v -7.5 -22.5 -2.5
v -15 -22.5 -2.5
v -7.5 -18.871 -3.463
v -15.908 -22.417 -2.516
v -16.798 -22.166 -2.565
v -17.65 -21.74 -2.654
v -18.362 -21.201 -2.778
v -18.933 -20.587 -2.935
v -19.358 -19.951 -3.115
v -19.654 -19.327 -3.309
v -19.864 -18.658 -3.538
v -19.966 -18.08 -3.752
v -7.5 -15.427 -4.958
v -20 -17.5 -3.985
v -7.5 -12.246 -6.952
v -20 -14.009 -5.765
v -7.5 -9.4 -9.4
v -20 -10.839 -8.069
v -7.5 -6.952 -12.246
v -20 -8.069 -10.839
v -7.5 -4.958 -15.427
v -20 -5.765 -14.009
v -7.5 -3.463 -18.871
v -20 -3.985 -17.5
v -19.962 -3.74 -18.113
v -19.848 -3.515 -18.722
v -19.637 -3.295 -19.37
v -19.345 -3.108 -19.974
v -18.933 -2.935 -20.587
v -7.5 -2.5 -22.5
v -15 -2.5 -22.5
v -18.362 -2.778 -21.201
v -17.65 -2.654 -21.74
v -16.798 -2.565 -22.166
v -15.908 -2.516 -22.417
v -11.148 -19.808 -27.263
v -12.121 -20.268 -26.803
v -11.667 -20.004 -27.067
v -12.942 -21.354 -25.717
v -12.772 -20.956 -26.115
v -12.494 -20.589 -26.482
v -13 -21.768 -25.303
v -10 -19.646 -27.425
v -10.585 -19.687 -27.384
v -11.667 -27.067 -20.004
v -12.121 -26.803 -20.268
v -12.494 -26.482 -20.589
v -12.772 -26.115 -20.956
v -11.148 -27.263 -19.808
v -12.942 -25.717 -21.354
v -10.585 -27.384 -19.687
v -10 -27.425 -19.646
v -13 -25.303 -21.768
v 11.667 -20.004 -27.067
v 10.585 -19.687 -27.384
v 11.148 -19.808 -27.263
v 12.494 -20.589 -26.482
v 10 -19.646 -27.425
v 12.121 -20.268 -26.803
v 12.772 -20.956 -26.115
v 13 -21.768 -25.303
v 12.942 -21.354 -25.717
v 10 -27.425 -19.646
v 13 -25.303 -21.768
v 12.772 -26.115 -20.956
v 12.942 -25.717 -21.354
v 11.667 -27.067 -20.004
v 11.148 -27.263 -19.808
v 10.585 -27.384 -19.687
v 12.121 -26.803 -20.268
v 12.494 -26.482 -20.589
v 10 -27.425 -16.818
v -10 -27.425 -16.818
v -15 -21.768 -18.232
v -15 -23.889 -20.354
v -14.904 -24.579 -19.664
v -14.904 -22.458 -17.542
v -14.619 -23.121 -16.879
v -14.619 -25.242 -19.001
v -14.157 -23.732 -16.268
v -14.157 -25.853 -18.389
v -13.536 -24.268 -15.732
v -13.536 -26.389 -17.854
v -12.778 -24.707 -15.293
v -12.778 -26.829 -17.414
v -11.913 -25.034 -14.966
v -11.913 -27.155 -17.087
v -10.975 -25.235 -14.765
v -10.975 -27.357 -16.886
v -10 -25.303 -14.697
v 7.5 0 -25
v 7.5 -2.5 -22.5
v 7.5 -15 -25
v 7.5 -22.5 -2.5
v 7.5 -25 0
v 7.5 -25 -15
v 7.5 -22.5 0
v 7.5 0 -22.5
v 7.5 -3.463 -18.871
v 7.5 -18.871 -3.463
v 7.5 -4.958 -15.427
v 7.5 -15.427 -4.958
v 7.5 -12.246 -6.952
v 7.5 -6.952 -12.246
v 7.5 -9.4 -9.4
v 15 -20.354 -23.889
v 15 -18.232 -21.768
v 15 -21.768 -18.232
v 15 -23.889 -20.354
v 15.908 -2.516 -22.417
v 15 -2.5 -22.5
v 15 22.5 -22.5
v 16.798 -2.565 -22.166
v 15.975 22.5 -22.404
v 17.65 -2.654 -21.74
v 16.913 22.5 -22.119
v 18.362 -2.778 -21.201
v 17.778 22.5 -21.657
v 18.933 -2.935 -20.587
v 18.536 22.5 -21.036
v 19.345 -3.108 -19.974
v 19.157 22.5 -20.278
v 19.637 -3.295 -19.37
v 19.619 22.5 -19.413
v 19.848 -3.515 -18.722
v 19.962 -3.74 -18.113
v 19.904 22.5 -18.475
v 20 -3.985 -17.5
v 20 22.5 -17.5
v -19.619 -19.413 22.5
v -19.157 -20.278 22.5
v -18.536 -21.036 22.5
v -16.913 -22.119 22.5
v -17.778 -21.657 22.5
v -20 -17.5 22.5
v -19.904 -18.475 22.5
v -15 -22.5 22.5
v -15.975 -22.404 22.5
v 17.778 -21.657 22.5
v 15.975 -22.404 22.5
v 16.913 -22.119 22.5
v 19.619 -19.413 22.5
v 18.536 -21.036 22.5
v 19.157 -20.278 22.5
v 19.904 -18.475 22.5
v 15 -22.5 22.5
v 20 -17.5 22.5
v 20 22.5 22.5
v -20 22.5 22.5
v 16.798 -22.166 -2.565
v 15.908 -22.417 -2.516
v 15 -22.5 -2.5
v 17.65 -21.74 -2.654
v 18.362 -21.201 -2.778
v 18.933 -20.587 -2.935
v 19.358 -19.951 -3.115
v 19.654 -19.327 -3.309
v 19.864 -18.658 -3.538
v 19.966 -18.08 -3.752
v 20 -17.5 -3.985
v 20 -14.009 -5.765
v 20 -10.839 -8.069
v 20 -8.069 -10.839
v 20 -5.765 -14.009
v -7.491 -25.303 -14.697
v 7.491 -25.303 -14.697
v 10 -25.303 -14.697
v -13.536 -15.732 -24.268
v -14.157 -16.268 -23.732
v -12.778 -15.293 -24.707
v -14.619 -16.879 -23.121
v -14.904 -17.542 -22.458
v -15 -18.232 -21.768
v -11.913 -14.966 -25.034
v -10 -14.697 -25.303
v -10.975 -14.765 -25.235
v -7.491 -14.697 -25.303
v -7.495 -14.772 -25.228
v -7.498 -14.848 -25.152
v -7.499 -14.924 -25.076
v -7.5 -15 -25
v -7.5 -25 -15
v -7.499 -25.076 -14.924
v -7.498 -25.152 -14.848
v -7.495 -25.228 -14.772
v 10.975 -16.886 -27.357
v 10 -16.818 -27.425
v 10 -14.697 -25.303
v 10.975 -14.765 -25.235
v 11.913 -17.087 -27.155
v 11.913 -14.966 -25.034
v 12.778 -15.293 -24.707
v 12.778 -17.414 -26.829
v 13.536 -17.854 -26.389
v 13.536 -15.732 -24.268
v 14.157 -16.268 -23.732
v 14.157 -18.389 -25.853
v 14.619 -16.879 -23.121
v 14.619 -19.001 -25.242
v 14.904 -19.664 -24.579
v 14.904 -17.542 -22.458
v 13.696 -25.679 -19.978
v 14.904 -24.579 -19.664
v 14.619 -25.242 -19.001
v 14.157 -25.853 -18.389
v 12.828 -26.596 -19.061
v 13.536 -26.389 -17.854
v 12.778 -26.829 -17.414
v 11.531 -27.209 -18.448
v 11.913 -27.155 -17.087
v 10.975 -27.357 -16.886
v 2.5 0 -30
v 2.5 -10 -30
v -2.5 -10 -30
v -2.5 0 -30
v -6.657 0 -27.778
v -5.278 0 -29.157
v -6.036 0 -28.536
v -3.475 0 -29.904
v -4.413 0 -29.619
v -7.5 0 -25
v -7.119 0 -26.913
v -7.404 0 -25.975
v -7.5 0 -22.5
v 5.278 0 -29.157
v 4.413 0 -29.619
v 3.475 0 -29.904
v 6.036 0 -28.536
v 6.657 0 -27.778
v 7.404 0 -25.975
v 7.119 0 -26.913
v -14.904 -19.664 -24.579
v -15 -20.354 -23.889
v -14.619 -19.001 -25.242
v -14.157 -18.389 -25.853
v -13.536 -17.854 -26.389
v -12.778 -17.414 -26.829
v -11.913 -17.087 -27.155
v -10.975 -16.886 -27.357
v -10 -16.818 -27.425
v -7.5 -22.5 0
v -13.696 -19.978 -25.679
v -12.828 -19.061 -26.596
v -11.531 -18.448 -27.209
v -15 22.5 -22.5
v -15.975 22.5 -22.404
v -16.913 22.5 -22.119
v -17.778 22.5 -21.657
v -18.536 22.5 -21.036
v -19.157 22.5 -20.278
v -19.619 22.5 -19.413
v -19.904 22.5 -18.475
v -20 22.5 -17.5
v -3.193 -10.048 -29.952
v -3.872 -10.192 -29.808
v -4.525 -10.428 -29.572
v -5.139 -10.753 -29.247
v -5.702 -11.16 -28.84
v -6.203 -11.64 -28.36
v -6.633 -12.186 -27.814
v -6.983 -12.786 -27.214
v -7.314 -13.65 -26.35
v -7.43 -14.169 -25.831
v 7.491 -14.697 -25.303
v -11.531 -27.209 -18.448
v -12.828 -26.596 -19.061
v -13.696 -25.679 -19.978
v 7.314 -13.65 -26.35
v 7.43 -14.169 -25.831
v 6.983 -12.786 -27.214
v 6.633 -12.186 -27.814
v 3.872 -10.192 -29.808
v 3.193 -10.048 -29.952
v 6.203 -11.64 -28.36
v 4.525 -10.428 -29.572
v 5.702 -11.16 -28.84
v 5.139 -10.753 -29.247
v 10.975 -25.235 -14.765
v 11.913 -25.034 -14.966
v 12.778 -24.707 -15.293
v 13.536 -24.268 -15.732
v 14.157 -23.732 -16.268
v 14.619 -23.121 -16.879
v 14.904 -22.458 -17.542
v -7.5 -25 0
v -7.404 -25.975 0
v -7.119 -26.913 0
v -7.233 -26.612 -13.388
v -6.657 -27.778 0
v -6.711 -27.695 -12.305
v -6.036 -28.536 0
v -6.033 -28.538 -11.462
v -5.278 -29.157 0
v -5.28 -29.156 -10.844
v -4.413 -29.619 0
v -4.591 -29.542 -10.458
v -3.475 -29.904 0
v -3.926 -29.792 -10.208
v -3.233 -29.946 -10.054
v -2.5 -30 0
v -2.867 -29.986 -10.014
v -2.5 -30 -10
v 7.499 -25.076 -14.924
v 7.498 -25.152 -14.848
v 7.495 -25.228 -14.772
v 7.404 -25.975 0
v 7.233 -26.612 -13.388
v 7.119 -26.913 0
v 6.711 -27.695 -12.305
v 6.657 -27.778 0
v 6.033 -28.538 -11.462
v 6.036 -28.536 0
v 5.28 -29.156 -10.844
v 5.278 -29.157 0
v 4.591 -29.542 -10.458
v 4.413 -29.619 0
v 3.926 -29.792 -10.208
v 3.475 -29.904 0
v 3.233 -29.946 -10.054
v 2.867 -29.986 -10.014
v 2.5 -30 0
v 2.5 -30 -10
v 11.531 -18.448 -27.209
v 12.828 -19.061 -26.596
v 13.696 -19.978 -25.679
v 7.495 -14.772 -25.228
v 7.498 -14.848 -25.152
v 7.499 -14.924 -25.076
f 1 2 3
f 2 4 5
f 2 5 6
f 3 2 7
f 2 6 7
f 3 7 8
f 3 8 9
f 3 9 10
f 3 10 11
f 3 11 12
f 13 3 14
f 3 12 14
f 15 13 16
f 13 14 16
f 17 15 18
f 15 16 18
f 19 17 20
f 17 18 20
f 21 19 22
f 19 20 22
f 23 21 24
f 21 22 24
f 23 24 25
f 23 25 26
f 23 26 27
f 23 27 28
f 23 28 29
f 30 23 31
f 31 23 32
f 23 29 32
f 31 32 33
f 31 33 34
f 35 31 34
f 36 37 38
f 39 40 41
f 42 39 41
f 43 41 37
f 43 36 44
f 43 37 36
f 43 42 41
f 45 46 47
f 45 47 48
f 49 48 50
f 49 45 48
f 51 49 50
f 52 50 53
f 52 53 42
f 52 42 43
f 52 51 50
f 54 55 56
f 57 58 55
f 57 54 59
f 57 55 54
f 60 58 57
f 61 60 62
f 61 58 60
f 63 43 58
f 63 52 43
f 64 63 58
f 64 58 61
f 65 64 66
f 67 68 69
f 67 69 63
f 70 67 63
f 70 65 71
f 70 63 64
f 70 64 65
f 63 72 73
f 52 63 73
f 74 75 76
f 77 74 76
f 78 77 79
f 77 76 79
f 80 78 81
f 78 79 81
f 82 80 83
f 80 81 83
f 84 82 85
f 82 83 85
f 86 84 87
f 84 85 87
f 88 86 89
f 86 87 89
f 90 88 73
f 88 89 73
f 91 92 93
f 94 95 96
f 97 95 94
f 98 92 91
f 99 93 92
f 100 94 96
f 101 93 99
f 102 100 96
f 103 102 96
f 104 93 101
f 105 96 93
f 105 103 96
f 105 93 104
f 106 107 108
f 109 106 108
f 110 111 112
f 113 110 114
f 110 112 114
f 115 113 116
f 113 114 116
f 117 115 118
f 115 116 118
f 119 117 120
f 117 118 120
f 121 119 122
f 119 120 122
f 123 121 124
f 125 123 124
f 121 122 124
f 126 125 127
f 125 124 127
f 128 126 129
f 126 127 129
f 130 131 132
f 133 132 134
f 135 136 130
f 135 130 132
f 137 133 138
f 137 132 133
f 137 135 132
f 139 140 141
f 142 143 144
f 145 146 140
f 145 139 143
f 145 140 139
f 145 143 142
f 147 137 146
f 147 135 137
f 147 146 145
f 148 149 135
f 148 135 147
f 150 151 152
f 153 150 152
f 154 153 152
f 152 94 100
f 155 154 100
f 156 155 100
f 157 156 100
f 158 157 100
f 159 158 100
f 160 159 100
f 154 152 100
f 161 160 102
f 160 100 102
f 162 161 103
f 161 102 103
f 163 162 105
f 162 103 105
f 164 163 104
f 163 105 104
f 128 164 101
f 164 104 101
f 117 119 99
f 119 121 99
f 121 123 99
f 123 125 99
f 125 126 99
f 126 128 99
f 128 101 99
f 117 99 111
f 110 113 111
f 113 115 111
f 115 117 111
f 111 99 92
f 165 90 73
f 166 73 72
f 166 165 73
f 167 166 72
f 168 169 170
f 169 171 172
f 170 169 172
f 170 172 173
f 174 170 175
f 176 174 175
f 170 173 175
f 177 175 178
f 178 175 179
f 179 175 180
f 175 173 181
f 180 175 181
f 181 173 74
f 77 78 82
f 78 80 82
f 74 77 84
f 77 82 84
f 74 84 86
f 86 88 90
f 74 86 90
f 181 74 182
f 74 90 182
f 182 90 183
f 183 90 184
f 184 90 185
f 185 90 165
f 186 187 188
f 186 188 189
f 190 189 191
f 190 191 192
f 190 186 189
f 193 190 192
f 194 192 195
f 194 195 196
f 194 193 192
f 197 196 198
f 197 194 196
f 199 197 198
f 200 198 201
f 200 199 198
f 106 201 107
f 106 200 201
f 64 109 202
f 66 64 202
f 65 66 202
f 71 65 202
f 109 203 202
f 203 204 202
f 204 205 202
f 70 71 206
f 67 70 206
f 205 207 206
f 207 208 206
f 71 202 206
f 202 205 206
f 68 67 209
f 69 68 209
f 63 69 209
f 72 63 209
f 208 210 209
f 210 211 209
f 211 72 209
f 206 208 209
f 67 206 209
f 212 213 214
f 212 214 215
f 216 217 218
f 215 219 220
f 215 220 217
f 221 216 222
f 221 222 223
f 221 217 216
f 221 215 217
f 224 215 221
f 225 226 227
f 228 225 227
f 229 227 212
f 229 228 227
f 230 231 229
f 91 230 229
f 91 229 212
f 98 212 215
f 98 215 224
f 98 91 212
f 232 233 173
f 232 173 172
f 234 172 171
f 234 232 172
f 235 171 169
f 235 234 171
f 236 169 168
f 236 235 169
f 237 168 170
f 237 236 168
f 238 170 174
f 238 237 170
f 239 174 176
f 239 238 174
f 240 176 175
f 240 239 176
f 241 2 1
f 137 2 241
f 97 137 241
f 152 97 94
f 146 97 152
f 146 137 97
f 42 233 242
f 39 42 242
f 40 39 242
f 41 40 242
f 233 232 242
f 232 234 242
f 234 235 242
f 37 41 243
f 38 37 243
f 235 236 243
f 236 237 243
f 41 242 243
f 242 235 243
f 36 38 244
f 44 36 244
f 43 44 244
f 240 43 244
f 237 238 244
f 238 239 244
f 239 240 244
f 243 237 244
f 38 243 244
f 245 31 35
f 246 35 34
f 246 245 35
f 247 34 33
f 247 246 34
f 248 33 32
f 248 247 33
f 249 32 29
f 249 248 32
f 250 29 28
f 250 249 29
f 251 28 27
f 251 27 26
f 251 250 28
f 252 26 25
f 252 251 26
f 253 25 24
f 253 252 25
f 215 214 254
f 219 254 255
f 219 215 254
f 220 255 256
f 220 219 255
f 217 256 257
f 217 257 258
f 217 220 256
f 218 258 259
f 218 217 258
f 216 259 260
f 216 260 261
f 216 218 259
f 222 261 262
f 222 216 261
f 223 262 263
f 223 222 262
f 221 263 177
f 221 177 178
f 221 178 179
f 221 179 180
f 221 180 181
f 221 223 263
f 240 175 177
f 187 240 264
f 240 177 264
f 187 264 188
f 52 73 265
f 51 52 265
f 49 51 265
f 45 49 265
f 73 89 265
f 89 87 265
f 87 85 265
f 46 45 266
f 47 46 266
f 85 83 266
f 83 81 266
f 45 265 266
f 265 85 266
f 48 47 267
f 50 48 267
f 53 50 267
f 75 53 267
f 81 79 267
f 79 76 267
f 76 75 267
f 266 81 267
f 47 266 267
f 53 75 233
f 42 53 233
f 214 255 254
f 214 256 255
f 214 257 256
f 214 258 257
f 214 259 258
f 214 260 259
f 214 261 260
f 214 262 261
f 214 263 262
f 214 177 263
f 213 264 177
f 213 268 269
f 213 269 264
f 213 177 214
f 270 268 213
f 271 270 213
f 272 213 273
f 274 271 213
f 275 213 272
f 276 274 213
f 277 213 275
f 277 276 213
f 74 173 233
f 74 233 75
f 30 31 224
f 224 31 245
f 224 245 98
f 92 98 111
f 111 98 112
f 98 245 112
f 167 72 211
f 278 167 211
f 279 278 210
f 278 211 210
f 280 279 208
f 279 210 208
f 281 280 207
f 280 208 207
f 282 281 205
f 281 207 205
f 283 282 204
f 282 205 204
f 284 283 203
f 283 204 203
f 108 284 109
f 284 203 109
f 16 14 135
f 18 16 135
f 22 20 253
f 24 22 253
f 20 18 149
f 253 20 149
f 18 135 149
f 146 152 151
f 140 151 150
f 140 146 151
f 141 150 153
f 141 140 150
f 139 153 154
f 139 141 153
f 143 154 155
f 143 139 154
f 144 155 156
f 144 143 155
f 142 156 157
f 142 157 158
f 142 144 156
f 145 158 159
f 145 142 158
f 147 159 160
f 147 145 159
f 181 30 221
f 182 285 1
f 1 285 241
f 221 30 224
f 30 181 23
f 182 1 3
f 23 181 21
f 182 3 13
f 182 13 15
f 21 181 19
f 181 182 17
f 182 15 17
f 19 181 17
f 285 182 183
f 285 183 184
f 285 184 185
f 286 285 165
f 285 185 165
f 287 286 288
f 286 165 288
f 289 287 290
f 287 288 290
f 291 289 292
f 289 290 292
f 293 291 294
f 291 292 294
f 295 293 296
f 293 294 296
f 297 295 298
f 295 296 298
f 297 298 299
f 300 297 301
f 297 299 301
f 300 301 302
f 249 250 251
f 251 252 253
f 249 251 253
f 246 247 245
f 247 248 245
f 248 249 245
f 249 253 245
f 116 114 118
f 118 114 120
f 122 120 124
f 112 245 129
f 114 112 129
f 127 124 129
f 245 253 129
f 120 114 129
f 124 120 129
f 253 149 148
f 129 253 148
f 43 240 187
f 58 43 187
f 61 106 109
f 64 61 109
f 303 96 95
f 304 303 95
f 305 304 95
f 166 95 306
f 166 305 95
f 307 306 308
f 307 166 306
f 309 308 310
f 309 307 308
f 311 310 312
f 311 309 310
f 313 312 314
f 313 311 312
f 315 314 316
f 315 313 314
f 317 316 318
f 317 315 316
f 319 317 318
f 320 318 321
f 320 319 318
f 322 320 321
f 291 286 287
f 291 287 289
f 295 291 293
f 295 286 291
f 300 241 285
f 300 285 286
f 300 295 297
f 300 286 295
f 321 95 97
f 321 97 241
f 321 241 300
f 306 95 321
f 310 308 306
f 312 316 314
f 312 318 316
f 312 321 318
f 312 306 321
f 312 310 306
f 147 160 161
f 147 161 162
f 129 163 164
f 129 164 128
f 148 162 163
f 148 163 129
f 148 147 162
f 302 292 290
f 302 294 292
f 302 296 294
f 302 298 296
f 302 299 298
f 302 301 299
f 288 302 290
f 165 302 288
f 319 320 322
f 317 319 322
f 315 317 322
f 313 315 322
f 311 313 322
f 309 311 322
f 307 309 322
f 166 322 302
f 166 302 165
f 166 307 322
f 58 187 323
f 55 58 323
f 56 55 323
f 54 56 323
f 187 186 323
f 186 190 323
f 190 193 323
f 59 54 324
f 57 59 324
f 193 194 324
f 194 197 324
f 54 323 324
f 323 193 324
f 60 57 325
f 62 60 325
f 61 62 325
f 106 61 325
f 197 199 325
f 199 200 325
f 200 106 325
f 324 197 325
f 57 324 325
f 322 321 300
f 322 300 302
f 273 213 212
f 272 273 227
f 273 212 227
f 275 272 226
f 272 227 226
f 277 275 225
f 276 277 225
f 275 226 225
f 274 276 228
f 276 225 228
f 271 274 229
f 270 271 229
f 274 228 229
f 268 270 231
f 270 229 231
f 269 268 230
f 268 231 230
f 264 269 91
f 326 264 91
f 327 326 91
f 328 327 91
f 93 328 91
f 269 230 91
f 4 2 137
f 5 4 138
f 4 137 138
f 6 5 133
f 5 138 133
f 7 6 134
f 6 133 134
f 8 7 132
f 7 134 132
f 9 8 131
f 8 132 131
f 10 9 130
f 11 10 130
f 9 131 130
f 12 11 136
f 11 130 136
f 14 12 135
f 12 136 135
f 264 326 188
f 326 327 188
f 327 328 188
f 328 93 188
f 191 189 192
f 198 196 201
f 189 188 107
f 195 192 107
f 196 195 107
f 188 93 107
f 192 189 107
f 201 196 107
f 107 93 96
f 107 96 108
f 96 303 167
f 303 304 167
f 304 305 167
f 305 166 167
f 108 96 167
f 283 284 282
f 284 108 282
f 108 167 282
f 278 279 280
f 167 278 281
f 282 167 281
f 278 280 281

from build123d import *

# Parameters (mm, degrees)
F0_W     = 40
F0_H     = 45
F1_DEPTH = 22.5
F3_DEPTH = 40.001
F5_DEPTH = 7.5
F6_R     = 5
F7_W     = 30
F7_H     = 15
F8_DEPTH = 5
F9_R     = 5
F10_SIZE = 2


with BuildPart() as f1:
    # F0 (on Top) → F1 (new body, symmetric)
    with BuildSketch(Plane.XY):
        Rectangle(F0_W, F0_H)
    extrude(amount=F1_DEPTH, both=True)

    # F2 (on face) → F3 (cut, through all)
    with BuildSketch(Plane(origin=(-20, 0, 0), x_dir=(0, -1, 0), z_dir=(-1, 0, 0))):
        with BuildLine():
            Line((2.5, -22.5), (22.5, -22.5))
            Line((22.5, -22.5), (22.5, -2.5))
            ThreePointArc((22.5, -2.5), (9.39971, -9.39971), (2.5, -22.5))
        make_face()
    extrude(amount=-F3_DEPTH, mode=Mode.SUBTRACT)

    # F4 (on Right) → F5 (join, symmetric)
    with BuildSketch(Plane.YZ):
        Polygon((0, -30), (0, 0), (-30, 0), (-30, -10), (-10, -30), align=None)
    extrude(amount=F5_DEPTH, both=True)

    # F6
    f6_edges = [f1.edges().sort_by_distance(p)[0] for p in [
        (-20, -22.5, 10),
        (20, -22.5, 10),
        (-20, 10, -22.5),
        (20, 10, -22.5),
        (7.5, -30, -5),
        (-7.5, -30, -5),
        (7.5, -5, -30),
        (-7.5, -5, -30),
    ]]
    fillet(f6_edges, radius=F6_R)

    # F7 (on face) → F8 (join)
    with BuildSketch(Plane(origin=(0, -20, -20), x_dir=(1, 0, 0), z_dir=(0, -0.707107, -0.707107))):
        Rectangle(F7_W, F7_H)
    extrude(amount=F8_DEPTH)

    # F9
    f9_edges = [f1.edges().sort_by_distance(p)[0] for p in [
        (-15, -27.071068, -16.464466),
        (-15, -16.464466, -27.071068),
        (15, -16.464466, -27.071068),
        (15, -27.071068, -16.464466),
    ]]
    fillet(f9_edges, radius=F9_R)

    # F10
    f10_edges = [f1.edges().sort_by_distance(p)[0] for p in [
        (0, -18.232233, -28.838835),
    ]]
    chamfer(f10_edges, length=F10_SIZE)


solid = f1.part
